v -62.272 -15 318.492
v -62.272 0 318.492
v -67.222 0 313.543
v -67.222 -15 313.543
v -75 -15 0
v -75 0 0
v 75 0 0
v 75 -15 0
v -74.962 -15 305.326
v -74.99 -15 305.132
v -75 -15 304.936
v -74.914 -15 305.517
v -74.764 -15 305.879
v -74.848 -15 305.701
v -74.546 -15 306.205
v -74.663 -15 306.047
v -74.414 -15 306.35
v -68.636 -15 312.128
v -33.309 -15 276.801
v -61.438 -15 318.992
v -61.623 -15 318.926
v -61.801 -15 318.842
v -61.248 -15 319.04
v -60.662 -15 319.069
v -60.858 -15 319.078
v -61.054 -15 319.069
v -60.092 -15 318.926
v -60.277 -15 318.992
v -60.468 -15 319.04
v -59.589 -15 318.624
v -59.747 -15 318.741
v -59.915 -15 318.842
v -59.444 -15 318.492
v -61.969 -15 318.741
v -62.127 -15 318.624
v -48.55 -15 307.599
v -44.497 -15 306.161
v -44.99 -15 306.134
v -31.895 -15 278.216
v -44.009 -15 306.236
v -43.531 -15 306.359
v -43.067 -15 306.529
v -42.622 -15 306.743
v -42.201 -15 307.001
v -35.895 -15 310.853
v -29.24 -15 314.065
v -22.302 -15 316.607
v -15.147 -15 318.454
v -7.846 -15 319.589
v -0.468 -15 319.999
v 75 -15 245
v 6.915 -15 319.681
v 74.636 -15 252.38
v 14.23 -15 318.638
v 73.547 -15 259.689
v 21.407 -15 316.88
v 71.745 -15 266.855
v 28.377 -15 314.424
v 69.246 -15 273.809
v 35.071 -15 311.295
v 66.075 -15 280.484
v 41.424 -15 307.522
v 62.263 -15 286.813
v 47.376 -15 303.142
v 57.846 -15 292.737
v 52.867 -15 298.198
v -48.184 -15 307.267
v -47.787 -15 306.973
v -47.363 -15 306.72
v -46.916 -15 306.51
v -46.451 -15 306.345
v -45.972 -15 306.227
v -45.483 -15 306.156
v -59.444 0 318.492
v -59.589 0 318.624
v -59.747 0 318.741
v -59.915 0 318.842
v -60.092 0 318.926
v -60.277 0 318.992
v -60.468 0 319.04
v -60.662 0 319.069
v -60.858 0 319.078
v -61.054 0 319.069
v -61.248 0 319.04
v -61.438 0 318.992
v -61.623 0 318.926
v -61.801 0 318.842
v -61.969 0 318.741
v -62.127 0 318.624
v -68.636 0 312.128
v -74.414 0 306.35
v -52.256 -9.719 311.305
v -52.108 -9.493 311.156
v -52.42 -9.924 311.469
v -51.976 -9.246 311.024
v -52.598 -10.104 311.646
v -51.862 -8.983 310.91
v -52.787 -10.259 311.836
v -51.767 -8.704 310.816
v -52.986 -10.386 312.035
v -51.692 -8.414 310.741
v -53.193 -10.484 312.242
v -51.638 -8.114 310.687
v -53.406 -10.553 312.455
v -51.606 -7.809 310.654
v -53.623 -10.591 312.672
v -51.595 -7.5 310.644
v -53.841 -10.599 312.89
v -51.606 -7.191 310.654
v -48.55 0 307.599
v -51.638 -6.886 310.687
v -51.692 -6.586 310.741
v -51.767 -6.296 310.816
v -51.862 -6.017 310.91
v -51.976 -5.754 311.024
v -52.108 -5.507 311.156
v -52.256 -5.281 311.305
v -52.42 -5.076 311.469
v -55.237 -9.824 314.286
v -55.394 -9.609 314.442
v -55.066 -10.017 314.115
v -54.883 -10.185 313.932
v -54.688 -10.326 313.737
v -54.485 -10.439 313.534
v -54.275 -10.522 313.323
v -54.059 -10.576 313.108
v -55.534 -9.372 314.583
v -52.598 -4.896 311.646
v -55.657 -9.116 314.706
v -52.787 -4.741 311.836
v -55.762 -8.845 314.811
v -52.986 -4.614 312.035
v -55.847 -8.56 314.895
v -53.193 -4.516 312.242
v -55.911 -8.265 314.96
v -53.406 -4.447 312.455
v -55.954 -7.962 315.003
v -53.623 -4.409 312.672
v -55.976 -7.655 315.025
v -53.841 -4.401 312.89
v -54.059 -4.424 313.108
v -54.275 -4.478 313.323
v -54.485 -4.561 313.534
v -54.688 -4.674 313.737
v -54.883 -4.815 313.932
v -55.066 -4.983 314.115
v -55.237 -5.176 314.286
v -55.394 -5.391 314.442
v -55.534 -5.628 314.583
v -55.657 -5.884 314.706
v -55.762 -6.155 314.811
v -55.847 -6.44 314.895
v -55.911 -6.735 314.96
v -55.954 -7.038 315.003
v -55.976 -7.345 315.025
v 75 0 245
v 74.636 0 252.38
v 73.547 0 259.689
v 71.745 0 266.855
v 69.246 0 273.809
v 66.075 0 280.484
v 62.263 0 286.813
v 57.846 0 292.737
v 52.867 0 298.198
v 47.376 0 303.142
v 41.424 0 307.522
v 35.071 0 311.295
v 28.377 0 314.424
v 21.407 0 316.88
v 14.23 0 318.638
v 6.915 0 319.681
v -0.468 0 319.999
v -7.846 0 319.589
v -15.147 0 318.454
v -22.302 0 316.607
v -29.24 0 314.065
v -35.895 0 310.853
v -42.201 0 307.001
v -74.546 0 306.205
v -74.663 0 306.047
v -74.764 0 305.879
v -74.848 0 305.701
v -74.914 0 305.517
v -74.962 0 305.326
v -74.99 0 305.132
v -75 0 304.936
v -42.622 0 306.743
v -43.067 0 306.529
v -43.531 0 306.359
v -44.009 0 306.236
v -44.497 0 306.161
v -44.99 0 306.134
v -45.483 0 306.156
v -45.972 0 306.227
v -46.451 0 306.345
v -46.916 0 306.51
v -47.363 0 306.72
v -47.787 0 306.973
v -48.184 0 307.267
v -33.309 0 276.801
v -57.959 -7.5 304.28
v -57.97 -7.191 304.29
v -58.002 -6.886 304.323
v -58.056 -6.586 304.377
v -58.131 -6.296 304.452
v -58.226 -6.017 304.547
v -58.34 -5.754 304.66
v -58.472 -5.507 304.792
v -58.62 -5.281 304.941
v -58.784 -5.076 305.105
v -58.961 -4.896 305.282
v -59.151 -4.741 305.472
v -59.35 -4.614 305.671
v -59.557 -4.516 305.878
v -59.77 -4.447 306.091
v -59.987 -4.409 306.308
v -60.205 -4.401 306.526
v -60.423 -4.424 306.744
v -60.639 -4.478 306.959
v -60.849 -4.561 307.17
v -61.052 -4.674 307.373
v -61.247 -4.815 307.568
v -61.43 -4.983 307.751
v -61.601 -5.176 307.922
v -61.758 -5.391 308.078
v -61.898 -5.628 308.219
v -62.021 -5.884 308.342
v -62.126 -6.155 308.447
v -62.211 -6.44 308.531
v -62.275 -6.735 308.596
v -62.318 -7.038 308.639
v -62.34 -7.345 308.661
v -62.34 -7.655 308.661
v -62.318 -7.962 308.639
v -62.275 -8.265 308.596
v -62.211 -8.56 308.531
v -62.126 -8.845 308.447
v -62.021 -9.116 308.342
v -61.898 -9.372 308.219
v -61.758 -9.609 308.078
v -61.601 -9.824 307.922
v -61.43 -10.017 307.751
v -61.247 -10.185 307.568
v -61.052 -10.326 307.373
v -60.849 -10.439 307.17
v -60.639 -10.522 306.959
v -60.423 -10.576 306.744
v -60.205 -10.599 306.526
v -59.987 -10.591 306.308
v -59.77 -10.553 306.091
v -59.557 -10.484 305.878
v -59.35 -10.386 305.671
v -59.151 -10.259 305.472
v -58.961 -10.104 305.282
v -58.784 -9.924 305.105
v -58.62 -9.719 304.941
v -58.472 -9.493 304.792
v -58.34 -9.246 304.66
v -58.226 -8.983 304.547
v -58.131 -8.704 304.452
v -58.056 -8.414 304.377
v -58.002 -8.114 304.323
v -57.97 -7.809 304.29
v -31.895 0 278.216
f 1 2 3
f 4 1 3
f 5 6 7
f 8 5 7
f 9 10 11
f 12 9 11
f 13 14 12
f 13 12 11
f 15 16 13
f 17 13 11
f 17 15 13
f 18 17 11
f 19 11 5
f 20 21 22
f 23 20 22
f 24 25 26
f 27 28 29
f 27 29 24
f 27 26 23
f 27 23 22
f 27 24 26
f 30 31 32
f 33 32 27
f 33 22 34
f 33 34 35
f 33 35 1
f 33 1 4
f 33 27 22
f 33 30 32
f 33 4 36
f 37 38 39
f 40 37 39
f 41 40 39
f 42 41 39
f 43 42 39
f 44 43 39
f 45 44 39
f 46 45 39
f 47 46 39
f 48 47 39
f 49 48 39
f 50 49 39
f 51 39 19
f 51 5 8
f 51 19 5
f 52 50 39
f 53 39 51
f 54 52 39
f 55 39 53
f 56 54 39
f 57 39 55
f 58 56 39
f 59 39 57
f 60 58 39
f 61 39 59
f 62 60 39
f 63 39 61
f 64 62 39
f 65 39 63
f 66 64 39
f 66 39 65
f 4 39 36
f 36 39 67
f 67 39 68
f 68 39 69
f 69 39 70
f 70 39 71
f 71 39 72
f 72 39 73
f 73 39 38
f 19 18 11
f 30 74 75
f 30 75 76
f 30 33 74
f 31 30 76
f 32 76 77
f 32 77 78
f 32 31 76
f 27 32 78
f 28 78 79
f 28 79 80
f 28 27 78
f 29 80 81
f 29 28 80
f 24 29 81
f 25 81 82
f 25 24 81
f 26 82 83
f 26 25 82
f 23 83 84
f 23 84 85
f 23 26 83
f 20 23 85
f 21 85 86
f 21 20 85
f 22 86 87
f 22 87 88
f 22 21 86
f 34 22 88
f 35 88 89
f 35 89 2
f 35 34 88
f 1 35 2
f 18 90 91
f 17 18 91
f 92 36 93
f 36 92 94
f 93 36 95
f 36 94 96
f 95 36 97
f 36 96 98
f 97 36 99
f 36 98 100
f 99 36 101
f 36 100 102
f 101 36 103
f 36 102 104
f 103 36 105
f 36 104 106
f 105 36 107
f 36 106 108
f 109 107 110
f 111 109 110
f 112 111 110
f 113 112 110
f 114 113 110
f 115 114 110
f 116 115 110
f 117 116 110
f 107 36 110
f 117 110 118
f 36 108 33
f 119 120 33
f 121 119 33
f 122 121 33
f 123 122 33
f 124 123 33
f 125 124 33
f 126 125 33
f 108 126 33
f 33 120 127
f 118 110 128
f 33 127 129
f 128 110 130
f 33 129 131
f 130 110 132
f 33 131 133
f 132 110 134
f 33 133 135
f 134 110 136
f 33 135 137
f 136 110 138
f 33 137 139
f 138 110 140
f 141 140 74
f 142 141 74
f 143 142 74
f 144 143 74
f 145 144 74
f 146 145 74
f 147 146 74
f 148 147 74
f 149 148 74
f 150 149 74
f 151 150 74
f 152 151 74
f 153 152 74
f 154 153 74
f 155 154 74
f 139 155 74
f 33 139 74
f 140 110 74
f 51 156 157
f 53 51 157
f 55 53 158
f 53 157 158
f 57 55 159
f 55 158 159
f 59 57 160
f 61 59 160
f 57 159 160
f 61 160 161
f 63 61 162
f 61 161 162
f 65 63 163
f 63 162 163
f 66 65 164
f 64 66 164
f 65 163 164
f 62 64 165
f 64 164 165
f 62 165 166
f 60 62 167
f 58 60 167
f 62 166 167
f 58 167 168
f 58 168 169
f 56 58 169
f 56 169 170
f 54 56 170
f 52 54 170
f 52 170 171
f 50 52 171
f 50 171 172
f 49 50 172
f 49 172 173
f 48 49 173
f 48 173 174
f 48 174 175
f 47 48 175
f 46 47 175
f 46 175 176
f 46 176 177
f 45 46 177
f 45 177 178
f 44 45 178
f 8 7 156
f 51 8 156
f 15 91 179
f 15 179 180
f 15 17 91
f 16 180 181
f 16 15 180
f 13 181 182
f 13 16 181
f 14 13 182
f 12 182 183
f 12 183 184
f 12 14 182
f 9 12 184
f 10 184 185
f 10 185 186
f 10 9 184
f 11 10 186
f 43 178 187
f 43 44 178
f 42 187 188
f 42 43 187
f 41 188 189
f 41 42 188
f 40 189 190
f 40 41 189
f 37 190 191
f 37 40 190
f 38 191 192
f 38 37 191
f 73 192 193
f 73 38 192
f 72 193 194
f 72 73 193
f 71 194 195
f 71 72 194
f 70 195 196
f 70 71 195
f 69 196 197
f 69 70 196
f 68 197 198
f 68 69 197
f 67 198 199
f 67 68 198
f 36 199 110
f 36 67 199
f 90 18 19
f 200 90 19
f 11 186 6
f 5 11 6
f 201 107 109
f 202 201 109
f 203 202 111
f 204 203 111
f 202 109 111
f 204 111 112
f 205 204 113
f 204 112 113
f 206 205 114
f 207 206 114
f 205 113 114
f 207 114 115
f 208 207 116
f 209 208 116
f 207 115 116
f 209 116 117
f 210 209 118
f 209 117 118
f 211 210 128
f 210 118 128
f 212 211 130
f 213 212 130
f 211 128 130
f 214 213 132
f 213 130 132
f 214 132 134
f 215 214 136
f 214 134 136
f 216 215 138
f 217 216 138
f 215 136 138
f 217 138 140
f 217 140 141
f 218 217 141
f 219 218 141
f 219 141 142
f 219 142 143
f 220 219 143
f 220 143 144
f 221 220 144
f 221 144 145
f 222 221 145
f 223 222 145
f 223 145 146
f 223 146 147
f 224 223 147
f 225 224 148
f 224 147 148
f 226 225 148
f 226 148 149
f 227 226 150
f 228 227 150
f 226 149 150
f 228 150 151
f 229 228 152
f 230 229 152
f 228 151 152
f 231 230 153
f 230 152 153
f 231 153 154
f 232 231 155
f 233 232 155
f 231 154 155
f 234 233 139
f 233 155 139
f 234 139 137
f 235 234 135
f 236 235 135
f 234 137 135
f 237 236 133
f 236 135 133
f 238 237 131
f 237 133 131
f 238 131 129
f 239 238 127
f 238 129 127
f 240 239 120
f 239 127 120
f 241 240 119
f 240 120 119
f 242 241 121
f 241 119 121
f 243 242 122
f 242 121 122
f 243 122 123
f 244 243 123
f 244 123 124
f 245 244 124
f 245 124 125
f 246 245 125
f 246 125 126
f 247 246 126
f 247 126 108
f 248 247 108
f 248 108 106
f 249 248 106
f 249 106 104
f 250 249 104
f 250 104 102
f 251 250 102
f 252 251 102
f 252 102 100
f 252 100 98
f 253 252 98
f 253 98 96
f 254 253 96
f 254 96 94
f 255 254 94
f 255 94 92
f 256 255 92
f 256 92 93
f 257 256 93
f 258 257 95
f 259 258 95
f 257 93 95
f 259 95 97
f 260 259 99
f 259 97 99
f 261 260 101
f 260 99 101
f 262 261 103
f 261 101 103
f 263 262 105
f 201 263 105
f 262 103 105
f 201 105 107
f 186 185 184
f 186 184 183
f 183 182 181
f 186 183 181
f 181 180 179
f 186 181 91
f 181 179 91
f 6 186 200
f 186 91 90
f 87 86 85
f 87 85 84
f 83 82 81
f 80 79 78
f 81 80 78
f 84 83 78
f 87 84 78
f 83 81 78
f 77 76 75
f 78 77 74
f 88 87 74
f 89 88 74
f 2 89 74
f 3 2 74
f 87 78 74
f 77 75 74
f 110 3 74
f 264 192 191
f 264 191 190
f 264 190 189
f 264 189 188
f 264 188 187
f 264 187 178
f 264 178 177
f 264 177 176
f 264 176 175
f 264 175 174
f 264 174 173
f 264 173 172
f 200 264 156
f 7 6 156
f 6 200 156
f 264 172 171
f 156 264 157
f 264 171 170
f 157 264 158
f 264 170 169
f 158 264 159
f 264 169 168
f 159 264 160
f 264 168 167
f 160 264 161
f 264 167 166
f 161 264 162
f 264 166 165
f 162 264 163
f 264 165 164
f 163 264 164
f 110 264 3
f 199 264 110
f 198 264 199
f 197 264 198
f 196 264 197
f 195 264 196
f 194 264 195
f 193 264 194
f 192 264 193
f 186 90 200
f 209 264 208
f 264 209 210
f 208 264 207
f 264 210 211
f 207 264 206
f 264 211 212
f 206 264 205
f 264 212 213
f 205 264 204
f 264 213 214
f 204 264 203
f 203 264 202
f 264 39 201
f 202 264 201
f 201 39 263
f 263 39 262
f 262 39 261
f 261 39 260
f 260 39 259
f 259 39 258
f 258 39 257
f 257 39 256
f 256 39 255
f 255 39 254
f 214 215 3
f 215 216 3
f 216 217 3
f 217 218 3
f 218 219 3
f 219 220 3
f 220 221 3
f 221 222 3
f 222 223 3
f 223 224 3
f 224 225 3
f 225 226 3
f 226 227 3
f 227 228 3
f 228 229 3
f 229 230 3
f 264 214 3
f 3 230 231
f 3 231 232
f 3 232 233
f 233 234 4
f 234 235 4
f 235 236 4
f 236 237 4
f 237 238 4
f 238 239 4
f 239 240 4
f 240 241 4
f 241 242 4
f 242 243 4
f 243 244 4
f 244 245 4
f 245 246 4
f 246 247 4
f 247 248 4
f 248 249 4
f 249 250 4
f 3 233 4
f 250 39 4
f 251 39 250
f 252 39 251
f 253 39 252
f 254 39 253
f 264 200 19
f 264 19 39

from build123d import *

# Parameters (mm, degrees)
F1_DEPTH = 15
F2_R     = 5
F3_R     = 2
F4_R     = 2
F6_DEPTH = 15.001
F7_R     = 3.1
F8_DEPTH = 9


with BuildPart() as f1:
    # F0 (on Front) → F1 (new body)
    with BuildSketch(Plane.XZ):
        with BuildLine():
            Line((-75, 305.764502), (-75, 0))
            Line((-75, 0), (75, 0))
            Line((75, 0), (75, 245))
            ThreePointArc((75, 245), (33.237011, 312.233185), (-45.541363, 304.590136))
            Line((-45.541363, 304.590136), (-60.857864, 319.906638))
            Line((-60.857864, 319.906638), (-75, 305.764502))
        make_face()
    extrude(amount=F1_DEPTH)

    # F2
    f2_edges = [f1.edges().sort_by_distance(p)[0] for p in [
        (-45.541363, -7.5, 304.590136),
    ]]
    fillet(f2_edges, radius=F2_R)

    # F3
    f3_edges = [f1.edges().sort_by_distance(p)[0] for p in [
        (-60.857864, -7.5, 319.906638),
    ]]
    fillet(f3_edges, radius=F3_R)

    # F4
    f4_edges = [f1.edges().sort_by_distance(p)[0] for p in [
        (-75, -7.5, 305.764502),
    ]]
    fillet(f4_edges, radius=F4_R)

    # F5 (on face) → F6 (cut, through all)
    with BuildSketch(Plane.XZ.offset(15)):
        Polygon((-67.221825, 313.542677), (-68.636039, 312.128463), (-33.308996, 276.80142), (-31.894782, 278.215633), align=None)
    extrude(amount=-F6_DEPTH, mode=Mode.SUBTRACT)

    # F7 (on face) → F8 (cut, through all)
    with BuildSketch(Plane(origin=(129.524387, 0, 129.524387), x_dir=(0.707107, 0, -0.707107), z_dir=(0.707107, 0, 0.707107))):
        with Locations((-259.241161, -7.5)):
            Circle(F7_R)
    extrude(amount=-F8_DEPTH, mode=Mode.SUBTRACT)


solid = f1.part
